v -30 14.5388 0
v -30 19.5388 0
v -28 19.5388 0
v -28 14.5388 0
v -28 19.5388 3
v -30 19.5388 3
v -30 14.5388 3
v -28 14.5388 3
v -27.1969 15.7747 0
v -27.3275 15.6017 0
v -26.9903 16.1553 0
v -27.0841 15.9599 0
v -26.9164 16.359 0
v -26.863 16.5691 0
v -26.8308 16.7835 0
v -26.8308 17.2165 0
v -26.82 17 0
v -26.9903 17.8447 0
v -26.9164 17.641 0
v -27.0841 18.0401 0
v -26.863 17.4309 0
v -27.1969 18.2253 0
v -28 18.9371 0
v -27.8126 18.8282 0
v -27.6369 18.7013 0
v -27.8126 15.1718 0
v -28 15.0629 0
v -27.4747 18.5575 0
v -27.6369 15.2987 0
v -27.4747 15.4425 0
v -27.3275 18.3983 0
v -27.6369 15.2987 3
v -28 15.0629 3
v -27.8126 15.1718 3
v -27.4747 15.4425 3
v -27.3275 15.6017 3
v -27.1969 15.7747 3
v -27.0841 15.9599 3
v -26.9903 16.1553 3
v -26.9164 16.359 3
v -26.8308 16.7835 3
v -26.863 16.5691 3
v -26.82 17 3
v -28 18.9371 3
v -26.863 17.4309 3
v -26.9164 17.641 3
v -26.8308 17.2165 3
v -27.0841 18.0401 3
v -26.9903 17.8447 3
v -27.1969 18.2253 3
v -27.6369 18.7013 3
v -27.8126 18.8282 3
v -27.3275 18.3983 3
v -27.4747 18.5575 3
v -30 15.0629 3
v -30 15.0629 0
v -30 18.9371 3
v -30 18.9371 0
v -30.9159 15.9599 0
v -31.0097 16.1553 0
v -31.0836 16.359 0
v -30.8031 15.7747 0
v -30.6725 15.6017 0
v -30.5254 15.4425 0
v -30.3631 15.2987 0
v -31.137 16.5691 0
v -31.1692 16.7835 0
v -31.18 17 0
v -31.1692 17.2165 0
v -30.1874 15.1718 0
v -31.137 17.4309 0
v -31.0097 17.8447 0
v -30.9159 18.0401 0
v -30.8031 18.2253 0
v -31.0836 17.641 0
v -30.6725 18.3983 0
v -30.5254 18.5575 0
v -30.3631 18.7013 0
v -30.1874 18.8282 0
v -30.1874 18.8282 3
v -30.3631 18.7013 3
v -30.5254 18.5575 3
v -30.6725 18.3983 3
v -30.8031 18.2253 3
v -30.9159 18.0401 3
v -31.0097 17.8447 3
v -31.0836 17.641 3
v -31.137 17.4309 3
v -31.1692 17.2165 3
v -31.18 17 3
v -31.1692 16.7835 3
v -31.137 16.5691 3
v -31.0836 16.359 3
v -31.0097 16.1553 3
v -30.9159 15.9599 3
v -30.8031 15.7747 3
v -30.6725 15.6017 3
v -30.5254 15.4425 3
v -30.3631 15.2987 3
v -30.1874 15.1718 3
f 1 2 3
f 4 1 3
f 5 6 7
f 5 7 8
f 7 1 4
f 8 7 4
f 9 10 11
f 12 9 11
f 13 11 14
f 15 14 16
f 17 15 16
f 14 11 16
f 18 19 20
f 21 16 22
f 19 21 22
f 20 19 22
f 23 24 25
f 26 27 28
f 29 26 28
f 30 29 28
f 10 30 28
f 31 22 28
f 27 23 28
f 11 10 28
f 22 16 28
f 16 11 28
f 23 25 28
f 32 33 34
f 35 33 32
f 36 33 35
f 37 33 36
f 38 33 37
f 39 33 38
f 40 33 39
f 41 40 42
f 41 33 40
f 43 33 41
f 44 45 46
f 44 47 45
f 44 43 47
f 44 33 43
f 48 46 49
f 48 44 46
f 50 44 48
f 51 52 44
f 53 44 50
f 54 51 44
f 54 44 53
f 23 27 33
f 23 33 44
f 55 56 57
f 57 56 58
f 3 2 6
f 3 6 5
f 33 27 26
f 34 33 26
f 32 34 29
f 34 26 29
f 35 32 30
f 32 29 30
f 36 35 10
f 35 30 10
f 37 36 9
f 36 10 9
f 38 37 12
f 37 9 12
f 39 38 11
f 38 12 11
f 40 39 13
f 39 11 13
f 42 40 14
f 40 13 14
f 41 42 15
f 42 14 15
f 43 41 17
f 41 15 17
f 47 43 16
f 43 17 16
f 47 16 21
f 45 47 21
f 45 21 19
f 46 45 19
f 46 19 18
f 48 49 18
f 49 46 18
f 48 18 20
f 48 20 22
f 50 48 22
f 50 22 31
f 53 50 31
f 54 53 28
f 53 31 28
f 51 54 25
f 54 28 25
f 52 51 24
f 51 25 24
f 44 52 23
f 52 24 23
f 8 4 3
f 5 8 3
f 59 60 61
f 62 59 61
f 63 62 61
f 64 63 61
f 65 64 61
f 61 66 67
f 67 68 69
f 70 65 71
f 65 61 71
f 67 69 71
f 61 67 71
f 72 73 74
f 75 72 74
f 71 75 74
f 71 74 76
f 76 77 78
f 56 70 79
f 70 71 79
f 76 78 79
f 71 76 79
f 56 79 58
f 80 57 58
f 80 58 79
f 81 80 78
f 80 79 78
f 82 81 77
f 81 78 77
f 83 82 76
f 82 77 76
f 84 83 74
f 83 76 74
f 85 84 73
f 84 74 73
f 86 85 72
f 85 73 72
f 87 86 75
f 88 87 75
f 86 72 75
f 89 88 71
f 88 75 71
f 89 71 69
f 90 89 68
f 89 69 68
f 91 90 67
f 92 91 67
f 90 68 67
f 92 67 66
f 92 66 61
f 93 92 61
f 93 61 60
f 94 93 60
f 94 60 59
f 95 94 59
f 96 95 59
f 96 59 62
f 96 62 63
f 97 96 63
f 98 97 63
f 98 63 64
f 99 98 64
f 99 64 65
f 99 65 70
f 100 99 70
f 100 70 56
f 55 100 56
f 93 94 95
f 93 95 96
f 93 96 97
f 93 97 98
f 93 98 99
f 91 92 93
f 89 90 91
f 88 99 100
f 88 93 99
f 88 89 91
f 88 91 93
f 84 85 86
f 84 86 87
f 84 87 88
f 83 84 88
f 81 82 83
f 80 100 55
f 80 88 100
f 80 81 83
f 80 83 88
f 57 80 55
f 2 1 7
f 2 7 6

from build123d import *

# Parameters (mm, degrees)
SKETCH001_W      = 2
SKETCH001_H      = 5
EXTRUDE002_DEPTH = 3
EXTRUDE001_DEPTH = 3
SKETCH_R         = 2.18
EXTRUDE_DEPTH    = 3


with BuildPart() as extrude002:
    # Sketch001 → Extrude002 (new body)
    with BuildSketch(Plane.XY):
        with Locations((-29.000001, 17.038815)):
            Rectangle(SKETCH001_W, SKETCH001_H)
    extrude(amount=EXTRUDE002_DEPTH)


with BuildPart() as extrude001:
    # Sketch001 → Extrude001 (new body)
    with BuildSketch(Plane.XY):
        with Locations((-29.000001, 17.038815)):
            Rectangle(SKETCH001_W, SKETCH001_H)
    extrude(amount=EXTRUDE001_DEPTH)


with BuildPart() as cut:
    # Sketch → Extrude (new body)
    with BuildSketch(Plane.XY):
        with Locations((-29, 17)):
            Circle(SKETCH_R)
    extrude(amount=EXTRUDE_DEPTH)

    # Cut: cut Extrude001
    add(extrude001.part, mode=Mode.SUBTRACT)


solid = Compound([extrude002.part, cut.part])
